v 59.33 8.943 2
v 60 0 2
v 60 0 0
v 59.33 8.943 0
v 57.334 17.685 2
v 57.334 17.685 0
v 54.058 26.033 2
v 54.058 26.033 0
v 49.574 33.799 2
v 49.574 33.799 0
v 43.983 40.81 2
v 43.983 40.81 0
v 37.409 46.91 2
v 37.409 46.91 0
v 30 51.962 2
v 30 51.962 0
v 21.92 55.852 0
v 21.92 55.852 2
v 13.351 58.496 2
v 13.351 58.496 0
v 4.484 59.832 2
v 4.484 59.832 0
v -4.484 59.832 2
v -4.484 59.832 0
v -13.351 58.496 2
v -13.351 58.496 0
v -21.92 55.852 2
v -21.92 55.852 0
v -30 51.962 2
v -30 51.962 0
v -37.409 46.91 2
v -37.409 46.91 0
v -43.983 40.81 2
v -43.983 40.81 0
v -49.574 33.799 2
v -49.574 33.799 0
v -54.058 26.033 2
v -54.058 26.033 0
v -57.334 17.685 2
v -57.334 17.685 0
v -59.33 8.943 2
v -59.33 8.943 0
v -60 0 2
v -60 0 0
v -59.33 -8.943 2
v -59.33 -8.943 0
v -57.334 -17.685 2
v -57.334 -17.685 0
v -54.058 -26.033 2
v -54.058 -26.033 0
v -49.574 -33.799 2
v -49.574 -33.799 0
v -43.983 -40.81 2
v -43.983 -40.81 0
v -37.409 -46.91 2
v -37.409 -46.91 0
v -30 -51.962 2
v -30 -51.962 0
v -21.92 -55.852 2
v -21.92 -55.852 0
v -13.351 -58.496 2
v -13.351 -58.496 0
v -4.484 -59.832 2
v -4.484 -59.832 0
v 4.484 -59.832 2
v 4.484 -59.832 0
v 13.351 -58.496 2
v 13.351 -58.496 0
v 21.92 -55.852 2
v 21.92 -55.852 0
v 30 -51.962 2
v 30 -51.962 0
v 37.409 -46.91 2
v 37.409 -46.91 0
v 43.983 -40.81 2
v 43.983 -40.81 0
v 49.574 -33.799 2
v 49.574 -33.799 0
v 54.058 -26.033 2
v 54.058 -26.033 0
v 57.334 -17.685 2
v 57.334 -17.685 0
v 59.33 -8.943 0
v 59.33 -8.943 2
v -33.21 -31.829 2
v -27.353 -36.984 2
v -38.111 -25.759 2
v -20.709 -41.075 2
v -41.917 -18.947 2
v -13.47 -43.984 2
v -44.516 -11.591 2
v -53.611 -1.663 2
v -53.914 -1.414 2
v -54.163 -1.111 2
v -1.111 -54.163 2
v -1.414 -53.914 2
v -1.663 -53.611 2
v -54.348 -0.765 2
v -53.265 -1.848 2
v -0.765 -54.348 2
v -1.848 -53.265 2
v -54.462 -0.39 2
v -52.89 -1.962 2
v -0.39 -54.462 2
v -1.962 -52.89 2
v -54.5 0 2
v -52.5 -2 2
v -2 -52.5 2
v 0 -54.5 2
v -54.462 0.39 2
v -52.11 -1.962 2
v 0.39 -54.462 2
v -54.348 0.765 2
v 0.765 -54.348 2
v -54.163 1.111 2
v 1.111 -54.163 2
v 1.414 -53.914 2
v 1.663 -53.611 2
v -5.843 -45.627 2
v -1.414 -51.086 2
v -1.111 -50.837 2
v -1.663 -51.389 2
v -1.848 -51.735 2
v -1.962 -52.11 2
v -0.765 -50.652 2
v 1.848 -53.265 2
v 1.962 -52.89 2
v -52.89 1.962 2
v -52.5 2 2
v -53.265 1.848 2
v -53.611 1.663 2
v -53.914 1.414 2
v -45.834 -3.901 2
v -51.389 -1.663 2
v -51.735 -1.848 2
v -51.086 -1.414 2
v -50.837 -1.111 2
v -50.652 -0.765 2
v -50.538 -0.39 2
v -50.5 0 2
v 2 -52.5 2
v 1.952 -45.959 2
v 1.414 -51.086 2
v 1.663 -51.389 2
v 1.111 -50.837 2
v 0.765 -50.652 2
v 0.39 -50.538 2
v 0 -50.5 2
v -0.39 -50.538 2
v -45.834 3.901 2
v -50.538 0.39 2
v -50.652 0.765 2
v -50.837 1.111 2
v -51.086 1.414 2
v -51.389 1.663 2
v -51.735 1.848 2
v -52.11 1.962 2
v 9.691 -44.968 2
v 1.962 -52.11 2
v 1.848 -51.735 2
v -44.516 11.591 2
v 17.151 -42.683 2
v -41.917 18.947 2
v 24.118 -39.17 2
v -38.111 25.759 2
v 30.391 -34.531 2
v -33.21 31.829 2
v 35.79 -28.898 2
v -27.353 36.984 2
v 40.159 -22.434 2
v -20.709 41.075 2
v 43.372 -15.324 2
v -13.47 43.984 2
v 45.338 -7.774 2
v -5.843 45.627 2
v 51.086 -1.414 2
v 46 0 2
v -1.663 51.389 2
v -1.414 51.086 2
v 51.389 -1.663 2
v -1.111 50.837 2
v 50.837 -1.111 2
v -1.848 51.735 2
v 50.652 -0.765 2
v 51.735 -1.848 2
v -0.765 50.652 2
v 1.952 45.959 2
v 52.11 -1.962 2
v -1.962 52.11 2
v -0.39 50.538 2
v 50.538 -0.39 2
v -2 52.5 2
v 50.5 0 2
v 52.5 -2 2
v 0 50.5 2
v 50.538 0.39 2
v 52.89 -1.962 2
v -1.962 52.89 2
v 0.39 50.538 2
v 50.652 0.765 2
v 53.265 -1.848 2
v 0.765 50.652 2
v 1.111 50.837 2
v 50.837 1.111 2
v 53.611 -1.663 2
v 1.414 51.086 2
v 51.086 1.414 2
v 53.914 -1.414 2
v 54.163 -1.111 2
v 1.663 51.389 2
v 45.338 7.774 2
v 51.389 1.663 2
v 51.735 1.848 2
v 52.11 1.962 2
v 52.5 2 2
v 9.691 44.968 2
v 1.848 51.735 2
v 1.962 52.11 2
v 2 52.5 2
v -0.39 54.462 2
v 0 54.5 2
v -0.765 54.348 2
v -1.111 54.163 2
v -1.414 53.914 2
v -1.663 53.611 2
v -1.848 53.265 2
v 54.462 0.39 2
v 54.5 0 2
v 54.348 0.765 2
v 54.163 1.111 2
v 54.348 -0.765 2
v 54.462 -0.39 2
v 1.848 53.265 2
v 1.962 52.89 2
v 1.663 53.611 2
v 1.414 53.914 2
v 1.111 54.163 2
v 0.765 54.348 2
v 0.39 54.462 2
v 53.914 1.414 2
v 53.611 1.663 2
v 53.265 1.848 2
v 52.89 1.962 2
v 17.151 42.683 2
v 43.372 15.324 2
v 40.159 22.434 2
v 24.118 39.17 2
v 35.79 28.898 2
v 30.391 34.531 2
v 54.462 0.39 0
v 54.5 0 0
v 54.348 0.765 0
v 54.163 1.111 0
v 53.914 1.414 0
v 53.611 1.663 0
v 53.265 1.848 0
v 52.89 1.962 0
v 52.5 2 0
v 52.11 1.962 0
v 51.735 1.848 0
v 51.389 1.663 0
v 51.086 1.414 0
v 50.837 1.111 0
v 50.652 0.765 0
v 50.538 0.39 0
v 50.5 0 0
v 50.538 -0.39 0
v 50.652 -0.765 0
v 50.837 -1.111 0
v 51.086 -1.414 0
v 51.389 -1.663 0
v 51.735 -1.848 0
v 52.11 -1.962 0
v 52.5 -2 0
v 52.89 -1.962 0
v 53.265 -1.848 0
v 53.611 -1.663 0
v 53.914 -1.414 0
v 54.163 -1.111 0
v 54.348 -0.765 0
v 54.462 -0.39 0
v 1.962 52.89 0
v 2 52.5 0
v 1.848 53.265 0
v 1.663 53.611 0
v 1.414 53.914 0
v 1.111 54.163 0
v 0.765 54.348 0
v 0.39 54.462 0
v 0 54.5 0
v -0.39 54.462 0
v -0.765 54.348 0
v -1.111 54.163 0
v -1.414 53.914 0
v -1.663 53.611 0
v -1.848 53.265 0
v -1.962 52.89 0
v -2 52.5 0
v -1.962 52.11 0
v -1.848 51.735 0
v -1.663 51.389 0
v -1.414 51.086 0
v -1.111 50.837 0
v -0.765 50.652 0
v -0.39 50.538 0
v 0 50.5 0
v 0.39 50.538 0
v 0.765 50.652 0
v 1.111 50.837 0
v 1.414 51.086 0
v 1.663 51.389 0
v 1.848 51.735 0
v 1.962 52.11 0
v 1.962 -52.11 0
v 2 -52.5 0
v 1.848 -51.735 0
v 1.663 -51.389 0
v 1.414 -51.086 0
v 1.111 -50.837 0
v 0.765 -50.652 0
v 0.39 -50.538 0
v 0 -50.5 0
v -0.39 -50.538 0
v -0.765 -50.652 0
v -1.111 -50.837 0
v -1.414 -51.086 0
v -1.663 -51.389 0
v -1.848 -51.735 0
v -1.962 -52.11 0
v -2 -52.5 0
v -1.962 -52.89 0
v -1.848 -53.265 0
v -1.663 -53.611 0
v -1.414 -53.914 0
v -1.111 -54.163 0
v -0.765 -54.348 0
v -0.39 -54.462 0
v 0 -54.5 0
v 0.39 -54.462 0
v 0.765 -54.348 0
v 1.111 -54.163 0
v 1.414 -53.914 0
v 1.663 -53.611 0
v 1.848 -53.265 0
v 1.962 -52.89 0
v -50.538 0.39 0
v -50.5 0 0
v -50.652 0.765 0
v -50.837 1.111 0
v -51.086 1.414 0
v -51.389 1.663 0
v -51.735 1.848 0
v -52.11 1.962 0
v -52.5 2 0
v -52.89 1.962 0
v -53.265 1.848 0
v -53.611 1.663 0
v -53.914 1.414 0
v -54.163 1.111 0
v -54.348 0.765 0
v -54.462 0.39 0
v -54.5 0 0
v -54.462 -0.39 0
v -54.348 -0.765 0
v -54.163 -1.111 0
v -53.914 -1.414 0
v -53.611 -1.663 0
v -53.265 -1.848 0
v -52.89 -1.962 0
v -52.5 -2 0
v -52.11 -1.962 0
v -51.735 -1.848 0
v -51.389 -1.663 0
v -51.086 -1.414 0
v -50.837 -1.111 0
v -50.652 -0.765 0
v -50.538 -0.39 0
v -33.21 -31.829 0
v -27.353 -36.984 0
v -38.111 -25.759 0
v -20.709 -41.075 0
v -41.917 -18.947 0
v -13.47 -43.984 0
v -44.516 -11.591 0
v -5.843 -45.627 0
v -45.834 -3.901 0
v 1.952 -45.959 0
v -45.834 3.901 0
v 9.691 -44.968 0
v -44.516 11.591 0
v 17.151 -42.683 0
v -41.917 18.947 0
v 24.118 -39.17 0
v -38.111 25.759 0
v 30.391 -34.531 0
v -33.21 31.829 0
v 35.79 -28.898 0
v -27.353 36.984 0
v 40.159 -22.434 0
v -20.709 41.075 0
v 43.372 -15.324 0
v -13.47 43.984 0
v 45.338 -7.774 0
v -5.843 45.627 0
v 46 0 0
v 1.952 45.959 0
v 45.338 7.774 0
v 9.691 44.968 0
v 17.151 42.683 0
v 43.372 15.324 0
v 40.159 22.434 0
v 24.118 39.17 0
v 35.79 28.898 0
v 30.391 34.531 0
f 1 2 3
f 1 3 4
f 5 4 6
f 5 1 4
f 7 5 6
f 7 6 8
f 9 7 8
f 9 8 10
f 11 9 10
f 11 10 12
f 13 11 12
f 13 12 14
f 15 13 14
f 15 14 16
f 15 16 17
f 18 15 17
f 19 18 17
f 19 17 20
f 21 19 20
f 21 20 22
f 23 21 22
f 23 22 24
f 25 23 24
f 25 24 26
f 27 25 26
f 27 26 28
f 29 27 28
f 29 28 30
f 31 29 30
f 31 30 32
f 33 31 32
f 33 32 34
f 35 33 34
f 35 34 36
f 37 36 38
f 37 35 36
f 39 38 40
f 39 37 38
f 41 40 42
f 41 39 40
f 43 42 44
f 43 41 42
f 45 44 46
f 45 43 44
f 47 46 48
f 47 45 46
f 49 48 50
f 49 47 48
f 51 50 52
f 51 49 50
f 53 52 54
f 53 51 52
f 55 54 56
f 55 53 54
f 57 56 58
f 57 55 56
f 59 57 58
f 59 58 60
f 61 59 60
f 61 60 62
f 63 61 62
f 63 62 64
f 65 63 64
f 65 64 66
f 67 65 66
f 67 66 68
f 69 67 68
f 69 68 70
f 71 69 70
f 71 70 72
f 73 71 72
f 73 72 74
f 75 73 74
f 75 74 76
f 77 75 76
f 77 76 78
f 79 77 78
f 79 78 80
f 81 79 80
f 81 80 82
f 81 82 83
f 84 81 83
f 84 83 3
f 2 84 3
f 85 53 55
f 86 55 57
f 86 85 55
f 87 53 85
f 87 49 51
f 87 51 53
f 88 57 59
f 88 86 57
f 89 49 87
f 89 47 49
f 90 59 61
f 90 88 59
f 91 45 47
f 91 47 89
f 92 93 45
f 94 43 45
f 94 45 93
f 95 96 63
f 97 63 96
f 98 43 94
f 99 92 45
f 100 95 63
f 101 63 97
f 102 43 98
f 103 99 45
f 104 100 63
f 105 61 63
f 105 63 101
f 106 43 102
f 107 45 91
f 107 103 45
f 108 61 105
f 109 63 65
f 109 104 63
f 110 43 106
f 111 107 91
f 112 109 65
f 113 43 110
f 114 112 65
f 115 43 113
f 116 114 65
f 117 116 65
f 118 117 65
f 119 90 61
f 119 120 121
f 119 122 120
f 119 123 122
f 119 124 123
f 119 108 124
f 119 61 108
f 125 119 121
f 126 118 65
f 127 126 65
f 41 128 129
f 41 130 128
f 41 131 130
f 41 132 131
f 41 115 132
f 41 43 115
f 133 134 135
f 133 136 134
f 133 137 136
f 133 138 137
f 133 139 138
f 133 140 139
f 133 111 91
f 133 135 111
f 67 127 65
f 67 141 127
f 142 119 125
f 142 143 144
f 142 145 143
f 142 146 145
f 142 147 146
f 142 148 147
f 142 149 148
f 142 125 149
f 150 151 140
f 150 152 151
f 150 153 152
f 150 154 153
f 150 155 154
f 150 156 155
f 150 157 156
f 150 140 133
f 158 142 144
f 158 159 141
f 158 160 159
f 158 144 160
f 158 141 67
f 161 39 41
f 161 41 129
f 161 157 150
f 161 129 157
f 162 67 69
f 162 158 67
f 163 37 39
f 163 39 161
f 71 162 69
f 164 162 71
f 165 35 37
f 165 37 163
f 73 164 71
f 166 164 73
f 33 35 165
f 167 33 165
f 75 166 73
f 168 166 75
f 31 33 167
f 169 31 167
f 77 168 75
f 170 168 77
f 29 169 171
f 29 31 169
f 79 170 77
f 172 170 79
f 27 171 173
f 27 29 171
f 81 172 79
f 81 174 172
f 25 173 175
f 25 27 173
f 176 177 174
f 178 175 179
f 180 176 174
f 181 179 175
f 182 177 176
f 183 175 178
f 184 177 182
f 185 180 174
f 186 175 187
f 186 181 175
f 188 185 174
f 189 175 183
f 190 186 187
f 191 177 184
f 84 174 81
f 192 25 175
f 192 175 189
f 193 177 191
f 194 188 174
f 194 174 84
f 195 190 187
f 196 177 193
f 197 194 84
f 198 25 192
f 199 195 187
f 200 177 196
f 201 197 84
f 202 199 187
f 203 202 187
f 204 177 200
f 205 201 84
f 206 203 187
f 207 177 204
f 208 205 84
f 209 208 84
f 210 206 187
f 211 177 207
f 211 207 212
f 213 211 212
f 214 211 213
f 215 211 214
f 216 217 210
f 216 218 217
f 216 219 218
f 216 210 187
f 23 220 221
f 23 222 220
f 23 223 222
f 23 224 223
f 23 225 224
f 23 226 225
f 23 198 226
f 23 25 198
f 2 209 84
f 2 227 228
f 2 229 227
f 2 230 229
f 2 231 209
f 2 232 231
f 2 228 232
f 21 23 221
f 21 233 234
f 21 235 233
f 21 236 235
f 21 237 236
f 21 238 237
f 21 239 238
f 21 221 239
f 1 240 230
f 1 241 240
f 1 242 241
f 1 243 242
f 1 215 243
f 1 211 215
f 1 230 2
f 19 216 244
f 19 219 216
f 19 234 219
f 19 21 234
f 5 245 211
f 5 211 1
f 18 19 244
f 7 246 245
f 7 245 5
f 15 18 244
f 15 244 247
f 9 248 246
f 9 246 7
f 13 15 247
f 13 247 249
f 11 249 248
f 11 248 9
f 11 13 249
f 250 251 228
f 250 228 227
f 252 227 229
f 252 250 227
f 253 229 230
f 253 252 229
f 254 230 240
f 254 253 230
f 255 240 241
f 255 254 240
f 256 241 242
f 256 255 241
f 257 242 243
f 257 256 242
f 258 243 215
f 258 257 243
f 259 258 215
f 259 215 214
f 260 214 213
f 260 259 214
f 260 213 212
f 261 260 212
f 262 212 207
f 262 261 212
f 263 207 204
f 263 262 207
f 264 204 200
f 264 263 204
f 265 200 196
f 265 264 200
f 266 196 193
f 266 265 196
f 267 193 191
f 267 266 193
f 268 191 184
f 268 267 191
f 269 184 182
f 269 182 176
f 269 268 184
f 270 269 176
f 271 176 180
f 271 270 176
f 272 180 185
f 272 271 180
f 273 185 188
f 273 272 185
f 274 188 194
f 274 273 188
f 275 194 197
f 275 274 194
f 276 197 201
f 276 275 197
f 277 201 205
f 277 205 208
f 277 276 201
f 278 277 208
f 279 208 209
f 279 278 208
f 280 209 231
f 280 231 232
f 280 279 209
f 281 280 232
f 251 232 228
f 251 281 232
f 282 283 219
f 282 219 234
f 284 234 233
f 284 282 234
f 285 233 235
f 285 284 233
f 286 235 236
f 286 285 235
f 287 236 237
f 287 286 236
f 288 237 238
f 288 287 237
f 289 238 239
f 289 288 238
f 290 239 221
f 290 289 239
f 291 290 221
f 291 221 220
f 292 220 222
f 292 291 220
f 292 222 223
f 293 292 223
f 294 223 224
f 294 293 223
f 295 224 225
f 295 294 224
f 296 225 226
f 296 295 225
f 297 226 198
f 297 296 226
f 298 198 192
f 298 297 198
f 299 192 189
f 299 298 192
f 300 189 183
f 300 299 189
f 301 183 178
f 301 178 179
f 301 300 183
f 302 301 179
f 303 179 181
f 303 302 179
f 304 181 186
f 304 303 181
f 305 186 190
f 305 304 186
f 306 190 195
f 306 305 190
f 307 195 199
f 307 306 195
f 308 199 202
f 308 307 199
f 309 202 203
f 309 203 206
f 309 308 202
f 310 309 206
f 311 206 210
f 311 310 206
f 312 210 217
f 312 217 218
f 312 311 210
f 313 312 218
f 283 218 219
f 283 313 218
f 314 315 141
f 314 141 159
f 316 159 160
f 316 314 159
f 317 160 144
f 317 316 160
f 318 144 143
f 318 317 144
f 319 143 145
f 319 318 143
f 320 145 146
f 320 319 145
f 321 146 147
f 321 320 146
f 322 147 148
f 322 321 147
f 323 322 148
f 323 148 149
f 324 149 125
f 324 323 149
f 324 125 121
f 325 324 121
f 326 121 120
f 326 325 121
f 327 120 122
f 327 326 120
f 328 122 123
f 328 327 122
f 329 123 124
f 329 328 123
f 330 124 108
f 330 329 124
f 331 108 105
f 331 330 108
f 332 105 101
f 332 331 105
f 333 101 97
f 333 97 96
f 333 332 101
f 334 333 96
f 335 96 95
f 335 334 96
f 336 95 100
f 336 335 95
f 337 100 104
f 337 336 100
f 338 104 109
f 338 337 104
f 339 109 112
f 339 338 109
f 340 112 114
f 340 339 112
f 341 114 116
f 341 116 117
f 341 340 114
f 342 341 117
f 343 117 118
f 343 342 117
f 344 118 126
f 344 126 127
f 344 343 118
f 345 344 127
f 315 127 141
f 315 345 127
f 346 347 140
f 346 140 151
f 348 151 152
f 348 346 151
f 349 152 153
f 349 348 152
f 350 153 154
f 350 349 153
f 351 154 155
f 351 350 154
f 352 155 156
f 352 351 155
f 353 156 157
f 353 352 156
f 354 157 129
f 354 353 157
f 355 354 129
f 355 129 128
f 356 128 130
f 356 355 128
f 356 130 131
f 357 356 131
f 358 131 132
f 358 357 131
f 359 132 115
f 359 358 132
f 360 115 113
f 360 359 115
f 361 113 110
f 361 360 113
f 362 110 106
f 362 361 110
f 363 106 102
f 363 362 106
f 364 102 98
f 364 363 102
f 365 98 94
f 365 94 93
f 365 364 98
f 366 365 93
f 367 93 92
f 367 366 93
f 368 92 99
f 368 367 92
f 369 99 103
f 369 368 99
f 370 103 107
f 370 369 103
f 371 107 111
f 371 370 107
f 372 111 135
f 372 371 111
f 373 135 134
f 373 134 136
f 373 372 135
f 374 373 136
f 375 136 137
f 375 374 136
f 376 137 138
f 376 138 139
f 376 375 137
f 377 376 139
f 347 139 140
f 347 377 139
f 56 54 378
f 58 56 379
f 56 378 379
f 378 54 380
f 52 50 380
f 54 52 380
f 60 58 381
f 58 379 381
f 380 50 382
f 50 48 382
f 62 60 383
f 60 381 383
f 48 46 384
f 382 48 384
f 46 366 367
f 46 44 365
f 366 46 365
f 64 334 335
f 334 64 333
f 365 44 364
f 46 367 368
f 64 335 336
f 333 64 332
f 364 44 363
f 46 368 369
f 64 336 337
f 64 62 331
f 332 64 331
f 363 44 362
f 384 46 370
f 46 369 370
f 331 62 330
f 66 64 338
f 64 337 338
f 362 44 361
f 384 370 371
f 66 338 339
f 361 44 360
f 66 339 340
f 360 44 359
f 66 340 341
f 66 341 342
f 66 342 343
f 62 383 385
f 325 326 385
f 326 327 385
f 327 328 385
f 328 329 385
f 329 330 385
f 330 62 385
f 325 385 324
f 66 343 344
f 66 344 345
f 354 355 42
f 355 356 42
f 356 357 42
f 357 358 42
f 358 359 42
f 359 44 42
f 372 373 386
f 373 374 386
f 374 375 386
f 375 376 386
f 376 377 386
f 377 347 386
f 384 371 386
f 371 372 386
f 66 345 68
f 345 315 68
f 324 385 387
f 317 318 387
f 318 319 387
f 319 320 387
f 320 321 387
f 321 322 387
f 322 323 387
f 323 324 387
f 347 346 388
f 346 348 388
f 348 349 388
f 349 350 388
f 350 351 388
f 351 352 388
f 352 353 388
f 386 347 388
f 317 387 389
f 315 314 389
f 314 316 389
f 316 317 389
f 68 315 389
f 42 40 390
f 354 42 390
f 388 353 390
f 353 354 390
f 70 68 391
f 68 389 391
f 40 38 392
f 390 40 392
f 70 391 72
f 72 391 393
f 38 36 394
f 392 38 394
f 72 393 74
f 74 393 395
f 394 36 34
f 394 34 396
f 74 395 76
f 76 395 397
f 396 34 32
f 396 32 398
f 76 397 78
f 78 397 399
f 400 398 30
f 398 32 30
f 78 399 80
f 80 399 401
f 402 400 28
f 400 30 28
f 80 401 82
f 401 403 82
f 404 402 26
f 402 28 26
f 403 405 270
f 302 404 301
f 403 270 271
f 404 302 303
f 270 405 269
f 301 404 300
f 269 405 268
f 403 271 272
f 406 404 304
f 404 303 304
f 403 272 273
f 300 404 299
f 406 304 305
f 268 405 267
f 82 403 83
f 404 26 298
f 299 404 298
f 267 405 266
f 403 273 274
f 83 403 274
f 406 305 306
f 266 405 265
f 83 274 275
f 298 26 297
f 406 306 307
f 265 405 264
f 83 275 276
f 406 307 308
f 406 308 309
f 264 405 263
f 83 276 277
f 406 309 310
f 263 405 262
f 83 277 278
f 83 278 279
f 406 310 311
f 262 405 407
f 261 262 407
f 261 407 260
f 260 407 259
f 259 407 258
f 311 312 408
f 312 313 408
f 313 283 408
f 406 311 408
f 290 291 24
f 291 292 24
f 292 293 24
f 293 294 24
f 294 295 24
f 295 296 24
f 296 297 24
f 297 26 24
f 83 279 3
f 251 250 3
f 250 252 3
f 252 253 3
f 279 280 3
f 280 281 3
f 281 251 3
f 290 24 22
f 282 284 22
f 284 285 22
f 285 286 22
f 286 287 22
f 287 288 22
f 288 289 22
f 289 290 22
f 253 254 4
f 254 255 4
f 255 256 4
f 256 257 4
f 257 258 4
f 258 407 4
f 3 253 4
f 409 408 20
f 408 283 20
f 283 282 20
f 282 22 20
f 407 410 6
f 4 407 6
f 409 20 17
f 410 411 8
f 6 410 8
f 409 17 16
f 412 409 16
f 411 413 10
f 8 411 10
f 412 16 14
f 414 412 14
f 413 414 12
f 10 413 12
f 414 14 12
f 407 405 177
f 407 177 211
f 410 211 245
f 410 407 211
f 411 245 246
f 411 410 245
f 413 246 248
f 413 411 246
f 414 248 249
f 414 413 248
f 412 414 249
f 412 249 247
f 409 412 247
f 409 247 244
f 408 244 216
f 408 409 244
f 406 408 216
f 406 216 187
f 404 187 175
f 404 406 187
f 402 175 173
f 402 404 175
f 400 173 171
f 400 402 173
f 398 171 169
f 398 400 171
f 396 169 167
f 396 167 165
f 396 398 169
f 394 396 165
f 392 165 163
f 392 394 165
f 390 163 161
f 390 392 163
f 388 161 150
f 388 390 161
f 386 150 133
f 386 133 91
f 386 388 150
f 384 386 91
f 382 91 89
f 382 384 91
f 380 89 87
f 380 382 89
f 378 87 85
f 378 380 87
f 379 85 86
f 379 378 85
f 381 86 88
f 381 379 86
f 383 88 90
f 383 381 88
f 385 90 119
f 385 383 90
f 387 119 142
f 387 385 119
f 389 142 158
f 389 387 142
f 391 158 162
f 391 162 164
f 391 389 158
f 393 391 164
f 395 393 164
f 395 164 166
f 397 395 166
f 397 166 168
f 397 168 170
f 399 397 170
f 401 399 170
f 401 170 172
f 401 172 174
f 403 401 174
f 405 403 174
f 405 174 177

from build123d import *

# Parameters (mm, degrees)
SKETCH_1_R          = 75
SKETCH_1_R_2        = 2
SKETCH_1_R_3        = 46
EXTRUDE_1_DEPTH     = 2
SKETCH_2_R          = 1.5
CUT_EXTRUDE_1_DEPTH = 2
SKETCH_4_OUTSIDE_W  = 194.428
SKETCH_4_OUTSIDE_H  = 194.428
SKETCH_4_OUTSIDE_R  = 60
CUT_EXTRUDE_2_DEPTH = 10


with BuildPart() as part:
    # 草图1 → 凸台-拉伸1 (new body)
    with BuildSketch(Plane.XY):
        Circle(SKETCH_1_R)
        with Locations((-52.5, 0)):
            Circle(SKETCH_1_R_2, mode=Mode.SUBTRACT)
        with Locations((0, 52.5)):
            Circle(SKETCH_1_R_2, mode=Mode.SUBTRACT)
        with Locations((52.5, 0)):
            Circle(SKETCH_1_R_2, mode=Mode.SUBTRACT)
        with Locations((0, -52.5)):
            Circle(SKETCH_1_R_2, mode=Mode.SUBTRACT)
        Circle(SKETCH_1_R_3, mode=Mode.SUBTRACT)
    extrude(amount=EXTRUDE_1_DEPTH)

    # 草图2 → 切除-拉伸1 (cut)
    with BuildSketch(Plane.XY.offset(2)):
        with Locations((0, 69)):
            Circle(SKETCH_2_R)
        with Locations((69, 0)):
            Circle(SKETCH_2_R)
        with Locations((0, -69)):
            Circle(SKETCH_2_R)
        with Locations((-69, 0)):
            Circle(SKETCH_2_R)
    extrude(amount=-CUT_EXTRUDE_1_DEPTH, mode=Mode.SUBTRACT)

    # 草图4 outside → 切除-拉伸2 (cut)
    with BuildSketch(Plane.XY.offset(2)):
        Rectangle(SKETCH_4_OUTSIDE_W, SKETCH_4_OUTSIDE_H)
        Circle(SKETCH_4_OUTSIDE_R, mode=Mode.SUBTRACT)
    extrude(amount=-CUT_EXTRUDE_2_DEPTH, mode=Mode.SUBTRACT)


solid = part.part
